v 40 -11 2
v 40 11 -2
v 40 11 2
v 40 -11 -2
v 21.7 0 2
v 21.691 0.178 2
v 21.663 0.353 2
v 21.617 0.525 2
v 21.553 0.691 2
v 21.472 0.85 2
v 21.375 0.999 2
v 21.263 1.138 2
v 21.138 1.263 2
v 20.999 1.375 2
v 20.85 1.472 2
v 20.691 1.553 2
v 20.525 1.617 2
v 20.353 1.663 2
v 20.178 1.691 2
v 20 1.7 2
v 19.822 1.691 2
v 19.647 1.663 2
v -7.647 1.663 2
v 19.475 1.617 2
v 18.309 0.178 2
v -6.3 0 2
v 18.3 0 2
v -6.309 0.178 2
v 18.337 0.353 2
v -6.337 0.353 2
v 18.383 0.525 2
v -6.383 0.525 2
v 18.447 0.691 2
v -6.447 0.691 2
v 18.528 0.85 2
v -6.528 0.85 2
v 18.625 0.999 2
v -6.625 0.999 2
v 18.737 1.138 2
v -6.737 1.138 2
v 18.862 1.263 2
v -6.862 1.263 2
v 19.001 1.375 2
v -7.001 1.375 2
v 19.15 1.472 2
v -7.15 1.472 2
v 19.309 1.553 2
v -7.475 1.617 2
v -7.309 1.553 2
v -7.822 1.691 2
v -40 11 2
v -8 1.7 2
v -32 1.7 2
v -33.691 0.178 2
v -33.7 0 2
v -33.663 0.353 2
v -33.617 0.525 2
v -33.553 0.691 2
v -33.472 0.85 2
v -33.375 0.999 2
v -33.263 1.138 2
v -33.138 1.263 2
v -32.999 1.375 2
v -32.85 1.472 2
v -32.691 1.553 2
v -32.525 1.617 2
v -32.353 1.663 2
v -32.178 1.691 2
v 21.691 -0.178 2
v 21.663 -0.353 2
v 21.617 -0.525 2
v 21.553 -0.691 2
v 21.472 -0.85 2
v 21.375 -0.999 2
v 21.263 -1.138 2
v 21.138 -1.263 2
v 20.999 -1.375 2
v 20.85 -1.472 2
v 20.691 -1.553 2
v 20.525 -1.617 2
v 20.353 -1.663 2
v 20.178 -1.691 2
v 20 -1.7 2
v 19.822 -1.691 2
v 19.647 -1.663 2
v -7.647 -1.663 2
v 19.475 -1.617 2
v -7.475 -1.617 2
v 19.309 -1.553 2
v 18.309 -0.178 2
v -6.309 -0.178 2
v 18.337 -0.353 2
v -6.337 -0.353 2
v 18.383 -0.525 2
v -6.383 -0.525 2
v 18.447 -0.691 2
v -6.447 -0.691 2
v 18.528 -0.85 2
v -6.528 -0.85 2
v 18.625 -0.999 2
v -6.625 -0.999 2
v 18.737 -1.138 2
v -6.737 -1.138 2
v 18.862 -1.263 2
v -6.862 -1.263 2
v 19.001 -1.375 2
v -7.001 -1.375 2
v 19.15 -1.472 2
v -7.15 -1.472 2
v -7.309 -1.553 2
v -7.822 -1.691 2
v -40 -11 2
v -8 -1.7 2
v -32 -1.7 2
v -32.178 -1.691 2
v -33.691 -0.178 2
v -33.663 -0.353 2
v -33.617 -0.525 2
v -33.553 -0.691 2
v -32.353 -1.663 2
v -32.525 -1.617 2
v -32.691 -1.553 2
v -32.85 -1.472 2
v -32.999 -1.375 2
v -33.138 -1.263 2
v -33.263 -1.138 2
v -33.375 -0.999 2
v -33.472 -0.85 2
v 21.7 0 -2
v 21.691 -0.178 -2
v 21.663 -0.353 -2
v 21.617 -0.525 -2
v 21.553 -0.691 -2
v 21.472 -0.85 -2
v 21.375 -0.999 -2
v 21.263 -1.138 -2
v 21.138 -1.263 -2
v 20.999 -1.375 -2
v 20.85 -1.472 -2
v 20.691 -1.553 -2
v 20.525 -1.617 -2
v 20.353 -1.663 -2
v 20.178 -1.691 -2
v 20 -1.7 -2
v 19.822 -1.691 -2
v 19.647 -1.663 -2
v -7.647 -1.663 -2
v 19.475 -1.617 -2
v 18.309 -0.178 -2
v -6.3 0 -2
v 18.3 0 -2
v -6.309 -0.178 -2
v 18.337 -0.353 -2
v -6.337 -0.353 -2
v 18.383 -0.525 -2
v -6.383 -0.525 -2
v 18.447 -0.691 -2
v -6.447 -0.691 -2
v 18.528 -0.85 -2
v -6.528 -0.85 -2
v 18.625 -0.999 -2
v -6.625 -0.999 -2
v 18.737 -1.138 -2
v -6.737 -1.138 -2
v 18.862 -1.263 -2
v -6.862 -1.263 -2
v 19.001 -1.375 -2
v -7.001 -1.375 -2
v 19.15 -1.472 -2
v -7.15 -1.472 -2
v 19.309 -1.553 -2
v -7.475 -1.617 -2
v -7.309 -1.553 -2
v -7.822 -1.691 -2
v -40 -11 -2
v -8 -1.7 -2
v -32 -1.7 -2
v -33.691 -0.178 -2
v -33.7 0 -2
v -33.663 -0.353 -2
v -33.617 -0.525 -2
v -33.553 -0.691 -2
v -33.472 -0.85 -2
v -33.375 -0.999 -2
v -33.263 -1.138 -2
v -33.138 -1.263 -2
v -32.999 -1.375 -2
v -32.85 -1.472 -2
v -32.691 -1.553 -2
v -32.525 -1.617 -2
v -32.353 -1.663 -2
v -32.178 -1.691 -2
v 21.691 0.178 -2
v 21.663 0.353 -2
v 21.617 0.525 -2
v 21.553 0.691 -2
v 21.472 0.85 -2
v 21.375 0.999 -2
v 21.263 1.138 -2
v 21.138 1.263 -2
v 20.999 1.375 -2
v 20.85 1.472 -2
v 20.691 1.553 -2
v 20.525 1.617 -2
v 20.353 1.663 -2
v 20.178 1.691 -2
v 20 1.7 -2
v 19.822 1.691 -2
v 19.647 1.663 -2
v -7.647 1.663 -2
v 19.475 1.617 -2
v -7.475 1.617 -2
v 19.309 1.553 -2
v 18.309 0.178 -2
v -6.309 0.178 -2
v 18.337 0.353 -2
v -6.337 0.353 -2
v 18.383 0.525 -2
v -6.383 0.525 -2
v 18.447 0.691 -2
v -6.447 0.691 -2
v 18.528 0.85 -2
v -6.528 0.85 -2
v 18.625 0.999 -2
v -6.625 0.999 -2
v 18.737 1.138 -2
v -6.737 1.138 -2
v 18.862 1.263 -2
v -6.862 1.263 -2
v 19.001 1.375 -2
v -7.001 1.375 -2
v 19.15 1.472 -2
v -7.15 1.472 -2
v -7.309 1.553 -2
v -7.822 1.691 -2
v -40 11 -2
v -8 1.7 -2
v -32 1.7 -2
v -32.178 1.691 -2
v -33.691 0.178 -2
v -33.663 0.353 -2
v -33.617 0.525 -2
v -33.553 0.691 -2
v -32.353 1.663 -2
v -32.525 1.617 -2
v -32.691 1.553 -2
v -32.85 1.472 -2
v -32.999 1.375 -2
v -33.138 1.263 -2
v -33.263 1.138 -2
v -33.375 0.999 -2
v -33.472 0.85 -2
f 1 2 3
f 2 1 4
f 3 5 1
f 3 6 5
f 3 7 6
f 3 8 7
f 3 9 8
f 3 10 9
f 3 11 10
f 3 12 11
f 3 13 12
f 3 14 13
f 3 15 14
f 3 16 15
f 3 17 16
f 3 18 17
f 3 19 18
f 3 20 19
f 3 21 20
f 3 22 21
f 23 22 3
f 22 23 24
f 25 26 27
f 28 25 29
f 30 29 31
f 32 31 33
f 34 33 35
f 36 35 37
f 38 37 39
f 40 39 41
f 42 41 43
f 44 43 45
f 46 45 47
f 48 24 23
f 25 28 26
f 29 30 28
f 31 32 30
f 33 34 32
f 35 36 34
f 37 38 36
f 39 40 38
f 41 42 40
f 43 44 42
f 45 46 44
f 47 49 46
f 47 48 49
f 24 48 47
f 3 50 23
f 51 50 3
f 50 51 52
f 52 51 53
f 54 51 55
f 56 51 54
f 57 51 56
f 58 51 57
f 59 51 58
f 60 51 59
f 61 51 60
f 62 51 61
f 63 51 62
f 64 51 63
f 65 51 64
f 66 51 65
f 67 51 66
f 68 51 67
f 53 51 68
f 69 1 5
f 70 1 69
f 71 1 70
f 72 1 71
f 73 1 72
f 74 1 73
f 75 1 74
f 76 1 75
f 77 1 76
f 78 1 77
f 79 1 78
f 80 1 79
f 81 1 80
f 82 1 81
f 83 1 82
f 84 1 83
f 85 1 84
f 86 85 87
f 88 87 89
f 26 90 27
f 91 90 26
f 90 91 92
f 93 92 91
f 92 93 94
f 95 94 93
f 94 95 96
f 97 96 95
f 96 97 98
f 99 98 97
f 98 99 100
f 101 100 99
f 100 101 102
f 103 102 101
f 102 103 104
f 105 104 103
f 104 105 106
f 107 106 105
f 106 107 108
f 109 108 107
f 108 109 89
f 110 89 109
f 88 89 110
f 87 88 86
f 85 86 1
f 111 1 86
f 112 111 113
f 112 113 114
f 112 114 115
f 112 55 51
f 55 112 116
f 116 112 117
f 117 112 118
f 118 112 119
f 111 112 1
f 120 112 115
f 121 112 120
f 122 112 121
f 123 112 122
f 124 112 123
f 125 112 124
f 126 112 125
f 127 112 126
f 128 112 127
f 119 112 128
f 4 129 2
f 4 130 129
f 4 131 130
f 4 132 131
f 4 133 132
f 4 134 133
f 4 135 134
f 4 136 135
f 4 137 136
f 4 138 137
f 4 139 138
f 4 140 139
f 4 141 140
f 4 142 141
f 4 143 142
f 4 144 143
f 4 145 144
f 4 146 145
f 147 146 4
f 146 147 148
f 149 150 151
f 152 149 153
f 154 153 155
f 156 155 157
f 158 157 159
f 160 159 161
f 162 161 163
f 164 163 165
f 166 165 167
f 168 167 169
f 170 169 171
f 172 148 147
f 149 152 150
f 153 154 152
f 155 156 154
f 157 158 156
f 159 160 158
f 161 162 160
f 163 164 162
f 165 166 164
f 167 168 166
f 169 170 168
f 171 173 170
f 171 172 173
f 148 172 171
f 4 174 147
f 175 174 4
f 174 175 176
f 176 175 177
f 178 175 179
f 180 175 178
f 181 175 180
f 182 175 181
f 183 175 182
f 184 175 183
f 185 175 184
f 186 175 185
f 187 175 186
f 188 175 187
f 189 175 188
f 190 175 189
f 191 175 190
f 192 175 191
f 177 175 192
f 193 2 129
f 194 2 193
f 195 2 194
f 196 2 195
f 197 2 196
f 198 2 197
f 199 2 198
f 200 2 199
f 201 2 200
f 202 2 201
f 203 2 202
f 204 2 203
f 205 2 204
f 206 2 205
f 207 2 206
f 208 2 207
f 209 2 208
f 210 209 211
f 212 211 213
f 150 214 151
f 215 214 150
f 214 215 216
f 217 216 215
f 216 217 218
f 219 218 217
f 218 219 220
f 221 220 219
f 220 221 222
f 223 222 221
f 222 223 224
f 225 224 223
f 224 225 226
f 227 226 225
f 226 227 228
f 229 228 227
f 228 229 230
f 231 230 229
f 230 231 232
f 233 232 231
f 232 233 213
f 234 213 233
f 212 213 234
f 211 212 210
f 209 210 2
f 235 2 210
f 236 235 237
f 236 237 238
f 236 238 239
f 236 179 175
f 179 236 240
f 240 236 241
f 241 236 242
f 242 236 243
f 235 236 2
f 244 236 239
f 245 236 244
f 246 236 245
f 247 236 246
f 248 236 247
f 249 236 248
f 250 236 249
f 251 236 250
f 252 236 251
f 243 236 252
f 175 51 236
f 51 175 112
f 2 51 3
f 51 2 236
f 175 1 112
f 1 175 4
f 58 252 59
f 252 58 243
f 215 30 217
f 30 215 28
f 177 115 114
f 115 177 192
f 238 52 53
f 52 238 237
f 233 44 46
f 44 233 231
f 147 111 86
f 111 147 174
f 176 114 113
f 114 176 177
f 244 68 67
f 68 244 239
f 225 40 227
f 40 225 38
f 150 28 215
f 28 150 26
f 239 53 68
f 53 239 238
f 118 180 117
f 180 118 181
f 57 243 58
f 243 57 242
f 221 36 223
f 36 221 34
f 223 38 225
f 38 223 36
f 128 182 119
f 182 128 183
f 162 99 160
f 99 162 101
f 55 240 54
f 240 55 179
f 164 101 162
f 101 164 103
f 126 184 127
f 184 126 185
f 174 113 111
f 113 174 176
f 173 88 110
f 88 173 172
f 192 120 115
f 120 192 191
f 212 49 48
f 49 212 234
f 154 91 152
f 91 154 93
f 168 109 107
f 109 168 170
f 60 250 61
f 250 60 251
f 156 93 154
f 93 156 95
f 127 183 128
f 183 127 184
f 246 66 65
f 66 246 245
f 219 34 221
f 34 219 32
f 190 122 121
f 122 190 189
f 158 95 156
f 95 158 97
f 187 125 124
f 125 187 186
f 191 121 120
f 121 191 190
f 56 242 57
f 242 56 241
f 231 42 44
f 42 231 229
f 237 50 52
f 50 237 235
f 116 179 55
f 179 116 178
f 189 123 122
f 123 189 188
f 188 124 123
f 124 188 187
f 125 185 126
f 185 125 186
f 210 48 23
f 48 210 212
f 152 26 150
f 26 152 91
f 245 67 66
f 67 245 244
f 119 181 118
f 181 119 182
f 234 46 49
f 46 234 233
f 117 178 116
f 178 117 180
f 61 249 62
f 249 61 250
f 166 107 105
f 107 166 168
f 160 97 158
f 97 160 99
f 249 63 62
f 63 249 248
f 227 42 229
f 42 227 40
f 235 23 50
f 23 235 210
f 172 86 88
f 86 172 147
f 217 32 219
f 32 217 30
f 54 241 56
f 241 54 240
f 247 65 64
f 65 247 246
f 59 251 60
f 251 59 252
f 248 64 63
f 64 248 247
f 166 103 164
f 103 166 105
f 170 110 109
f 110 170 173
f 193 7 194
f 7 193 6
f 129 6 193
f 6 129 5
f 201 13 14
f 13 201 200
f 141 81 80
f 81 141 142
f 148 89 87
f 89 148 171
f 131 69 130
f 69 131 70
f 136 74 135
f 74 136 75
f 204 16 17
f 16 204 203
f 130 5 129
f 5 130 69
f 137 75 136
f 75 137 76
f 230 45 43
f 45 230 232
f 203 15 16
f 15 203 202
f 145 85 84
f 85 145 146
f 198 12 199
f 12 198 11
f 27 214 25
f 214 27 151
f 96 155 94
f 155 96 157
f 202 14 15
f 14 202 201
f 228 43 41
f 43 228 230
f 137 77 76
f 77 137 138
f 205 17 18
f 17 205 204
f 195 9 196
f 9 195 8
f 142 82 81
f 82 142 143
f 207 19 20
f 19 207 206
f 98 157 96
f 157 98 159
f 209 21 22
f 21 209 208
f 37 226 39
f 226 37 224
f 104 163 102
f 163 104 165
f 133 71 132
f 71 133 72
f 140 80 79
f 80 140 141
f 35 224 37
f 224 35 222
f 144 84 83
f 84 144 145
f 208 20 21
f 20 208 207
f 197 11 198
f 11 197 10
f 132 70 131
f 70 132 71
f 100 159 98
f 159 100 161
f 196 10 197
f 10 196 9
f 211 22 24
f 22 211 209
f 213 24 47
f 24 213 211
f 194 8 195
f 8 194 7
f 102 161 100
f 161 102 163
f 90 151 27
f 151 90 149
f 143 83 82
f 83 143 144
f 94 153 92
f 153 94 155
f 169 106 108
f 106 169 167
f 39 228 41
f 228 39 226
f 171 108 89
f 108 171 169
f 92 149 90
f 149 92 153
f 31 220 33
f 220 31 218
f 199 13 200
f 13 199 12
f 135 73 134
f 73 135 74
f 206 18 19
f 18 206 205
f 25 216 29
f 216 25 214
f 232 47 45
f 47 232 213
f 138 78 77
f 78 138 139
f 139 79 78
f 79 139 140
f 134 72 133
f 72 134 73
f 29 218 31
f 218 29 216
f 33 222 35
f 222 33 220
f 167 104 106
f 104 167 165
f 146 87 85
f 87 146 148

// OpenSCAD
// Adjustable sensor mounting tab.
$fn = 60;
eps = 0.02;
length = 80;
width = 22;
thickness = 4;
slot_l = 24;
module slot(x) { hull() { translate([x-slot_l/2,0,-thickness/2-eps]) cylinder(d=3.4,h=thickness+2*eps); translate([x+slot_l/2,0,-thickness/2-eps]) cylinder(d=3.4,h=thickness+2*eps); } }
difference() { cube([length,width,thickness],center=true); slot(-length/4); translate([length/4,0,-thickness/2-eps]) cylinder(d=3.4,h=thickness+2*eps); }
